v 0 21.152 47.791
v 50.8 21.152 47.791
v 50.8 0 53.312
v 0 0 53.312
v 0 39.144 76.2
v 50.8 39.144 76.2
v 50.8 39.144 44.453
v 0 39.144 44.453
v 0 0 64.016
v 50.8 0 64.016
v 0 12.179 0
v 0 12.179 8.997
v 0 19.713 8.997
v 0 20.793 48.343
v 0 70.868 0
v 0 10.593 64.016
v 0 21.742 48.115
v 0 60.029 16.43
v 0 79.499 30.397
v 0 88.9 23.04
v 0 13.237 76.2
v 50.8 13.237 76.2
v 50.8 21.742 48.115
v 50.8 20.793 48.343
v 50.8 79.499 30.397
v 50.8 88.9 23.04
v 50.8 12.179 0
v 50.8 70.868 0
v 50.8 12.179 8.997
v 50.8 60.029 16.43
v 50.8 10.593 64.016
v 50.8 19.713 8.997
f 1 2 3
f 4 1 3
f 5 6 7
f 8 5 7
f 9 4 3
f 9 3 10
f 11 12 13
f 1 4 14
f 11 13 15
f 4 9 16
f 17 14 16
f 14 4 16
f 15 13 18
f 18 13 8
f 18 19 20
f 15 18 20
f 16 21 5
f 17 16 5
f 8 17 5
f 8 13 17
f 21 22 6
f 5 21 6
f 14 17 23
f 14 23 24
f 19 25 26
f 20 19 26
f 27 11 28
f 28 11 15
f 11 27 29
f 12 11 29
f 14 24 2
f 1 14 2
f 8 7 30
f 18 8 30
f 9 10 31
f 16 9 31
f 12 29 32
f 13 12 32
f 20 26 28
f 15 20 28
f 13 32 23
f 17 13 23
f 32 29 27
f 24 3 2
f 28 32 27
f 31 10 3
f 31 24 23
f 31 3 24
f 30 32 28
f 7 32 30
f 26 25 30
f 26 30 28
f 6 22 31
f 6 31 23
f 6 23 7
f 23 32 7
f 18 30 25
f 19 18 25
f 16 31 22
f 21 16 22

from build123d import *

# Parameters (mm, degrees)
F0_W     = 88.9
F0_H     = 76.2
F1_DEPTH = 50.8
F4_DEPTH = 50.8
F7_DEPTH = 50.8


with BuildPart() as f1:
    # F0 (on Right) → F1 (new body)
    with BuildSketch(Plane.YZ):
        with Locations((44.45, 38.1)):
            Rectangle(F0_W, F0_H)
    extrude(amount=F1_DEPTH)

    # F2 (on face) → F4 (cut)
    with BuildSketch(Plane.YZ.offset(50.8)):
        Polygon((0, 76.2), (0, 64.015649), (10.592989, 64.015649), (13.236613, 76.2), align=None)
        Polygon((88.9, 76.2), (39.144106, 76.2), (39.144106, 44.45285), (60.028717, 16.43046), (79.499279, 30.397216), (88.9, 23.039514), align=None)
        Polygon((88.9, 23.039514), (70.867568, 0), (88.9, 0), align=None)
    extrude(amount=-F4_DEPTH, mode=Mode.SUBTRACT)

    # F6 (on face) → F7 (cut)
    with BuildSketch(Plane.YZ.offset(50.8)):
        Polygon((21.15212, 47.791194), (0, 53.31191), (0, 0), (12.17937, 0), (12.17937, 8.996861), (19.713309, 8.996861), (21.741677, 48.115388), (20.793015, 48.34297), align=None)
    extrude(amount=-F7_DEPTH, mode=Mode.SUBTRACT)


solid = f1.part
